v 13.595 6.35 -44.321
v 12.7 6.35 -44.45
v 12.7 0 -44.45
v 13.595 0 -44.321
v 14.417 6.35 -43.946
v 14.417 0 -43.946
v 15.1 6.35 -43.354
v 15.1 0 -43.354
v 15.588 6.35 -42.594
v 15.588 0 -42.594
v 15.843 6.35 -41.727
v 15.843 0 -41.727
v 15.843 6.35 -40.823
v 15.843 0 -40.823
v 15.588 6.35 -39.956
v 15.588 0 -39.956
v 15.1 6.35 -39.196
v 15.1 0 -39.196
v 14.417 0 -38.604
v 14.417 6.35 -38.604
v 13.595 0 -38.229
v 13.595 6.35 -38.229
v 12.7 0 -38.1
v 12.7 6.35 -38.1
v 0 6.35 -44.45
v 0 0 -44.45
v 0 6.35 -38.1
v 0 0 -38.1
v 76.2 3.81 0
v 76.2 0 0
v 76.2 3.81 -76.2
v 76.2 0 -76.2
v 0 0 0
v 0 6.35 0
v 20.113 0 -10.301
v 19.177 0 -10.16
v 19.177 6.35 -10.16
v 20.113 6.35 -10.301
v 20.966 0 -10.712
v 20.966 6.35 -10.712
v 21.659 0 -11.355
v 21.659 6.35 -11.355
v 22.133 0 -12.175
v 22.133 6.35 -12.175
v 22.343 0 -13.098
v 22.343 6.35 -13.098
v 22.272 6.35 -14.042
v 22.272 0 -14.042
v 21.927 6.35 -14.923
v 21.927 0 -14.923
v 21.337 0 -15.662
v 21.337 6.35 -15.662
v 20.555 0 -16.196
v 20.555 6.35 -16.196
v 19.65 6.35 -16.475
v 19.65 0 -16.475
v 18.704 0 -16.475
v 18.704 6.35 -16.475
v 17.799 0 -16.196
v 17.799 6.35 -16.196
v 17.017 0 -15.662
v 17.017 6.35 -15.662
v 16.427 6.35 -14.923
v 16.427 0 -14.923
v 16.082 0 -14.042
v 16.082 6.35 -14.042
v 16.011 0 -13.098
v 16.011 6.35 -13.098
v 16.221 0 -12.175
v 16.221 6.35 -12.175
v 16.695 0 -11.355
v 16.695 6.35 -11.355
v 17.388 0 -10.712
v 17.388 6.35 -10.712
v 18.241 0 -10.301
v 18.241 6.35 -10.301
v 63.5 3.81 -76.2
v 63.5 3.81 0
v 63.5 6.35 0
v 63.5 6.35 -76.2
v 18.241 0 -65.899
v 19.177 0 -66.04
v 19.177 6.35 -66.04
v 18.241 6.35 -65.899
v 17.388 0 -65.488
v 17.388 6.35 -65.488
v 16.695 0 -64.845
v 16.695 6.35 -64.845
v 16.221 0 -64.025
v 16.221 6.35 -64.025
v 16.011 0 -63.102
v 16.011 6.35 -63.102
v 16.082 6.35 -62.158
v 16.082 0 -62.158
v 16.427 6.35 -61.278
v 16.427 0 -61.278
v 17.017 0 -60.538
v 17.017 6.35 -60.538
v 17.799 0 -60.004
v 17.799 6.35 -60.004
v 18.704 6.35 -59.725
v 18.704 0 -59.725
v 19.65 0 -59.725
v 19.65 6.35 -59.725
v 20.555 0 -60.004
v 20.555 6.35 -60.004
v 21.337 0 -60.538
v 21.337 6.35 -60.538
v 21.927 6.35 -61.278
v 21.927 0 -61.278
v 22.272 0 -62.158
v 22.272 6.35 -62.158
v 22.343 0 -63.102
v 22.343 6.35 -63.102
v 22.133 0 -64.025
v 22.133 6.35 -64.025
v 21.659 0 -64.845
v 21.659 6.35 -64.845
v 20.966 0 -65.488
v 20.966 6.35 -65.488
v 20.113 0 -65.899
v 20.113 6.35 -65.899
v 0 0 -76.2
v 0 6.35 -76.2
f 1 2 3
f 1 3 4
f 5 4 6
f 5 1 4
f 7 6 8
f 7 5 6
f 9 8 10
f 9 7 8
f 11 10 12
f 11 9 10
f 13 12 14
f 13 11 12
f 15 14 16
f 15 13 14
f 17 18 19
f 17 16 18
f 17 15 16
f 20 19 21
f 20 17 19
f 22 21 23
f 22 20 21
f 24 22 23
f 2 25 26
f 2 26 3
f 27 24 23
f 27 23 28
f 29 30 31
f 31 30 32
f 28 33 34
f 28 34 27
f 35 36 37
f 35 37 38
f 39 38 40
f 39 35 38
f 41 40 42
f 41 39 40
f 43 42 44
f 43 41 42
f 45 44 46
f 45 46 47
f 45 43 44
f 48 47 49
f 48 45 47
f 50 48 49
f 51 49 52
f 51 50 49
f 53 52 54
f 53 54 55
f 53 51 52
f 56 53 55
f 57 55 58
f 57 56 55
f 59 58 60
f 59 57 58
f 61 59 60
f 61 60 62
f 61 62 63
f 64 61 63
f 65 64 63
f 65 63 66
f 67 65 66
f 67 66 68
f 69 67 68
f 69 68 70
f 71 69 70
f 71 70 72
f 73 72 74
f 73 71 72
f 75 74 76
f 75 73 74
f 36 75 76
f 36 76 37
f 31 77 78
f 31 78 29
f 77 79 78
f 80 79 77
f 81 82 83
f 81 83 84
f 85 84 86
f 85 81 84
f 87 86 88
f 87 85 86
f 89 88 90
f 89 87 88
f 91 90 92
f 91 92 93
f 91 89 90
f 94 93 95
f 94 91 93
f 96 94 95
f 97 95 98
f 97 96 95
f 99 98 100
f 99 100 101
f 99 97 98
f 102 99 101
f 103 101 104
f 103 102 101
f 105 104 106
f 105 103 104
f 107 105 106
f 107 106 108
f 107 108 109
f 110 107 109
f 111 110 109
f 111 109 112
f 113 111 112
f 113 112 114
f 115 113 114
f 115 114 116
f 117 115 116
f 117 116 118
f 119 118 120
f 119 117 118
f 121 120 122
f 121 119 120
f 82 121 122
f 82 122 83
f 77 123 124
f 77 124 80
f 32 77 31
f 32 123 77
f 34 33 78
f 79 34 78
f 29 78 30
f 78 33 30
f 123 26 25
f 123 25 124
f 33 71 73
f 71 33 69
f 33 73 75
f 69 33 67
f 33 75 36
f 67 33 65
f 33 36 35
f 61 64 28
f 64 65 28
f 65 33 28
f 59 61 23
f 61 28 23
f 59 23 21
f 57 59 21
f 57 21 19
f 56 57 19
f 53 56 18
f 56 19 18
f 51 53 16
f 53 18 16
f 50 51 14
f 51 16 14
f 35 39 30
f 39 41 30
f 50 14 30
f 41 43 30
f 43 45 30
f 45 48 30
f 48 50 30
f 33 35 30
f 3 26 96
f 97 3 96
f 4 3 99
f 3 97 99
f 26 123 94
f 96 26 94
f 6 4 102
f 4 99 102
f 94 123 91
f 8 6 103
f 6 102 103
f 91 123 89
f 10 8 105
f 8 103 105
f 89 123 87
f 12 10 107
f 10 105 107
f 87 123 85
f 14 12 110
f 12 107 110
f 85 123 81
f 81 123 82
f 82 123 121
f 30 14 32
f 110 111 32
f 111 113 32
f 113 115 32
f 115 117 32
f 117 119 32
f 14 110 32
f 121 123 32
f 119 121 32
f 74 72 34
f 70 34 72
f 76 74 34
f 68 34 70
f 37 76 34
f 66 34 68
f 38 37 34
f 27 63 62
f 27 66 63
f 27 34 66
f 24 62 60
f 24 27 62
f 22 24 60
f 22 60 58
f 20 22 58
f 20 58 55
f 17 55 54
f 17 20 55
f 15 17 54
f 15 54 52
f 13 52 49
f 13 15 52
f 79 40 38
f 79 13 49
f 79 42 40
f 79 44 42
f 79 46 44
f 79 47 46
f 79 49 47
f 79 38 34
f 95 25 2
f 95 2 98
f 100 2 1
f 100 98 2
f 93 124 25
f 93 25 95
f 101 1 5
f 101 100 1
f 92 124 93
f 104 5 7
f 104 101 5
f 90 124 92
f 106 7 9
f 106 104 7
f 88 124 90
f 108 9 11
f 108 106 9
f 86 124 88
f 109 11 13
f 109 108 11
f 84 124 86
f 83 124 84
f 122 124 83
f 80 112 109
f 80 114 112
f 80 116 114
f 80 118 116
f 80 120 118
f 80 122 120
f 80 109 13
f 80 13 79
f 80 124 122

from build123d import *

# Parameters (mm, degrees)
SKETCH1_W           = 63.5
SKETCH1_H           = 76.2
SKETCH1_R           = 3.175
SKETCH1_W_2         = 12.7
BOSS_EXTRUDE1_DEPTH = 6.35
SKETCH2_W           = 12.7
SKETCH2_H           = 76.2
CUT_EXTRUDE1_DEPTH  = 2.54
CUT_EXTRUDE2_DEPTH  = 108.95


with BuildPart() as part:
    # Sketch1 → Boss-Extrude1 (new body)
    # profile 1 of 2: a face of its own
    with BuildSketch(Plane(origin=(0, 0, 0), x_dir=(1, 0, 0), z_dir=(0, 1, 0))):
        with Locations((31.75, 38.1)):
            Rectangle(SKETCH1_W, SKETCH1_H)
        with Locations(Location((19.177, 13.335, 0), (0, 0, 270))):
            Circle(SKETCH1_R, mode=Mode.SUBTRACT)
        with Locations(Location((19.177, 62.865, 0), (0, 0, 90))):
            Circle(SKETCH1_R, mode=Mode.SUBTRACT)
    # profile 2 of 2: a face of its own
    with BuildSketch(Plane(origin=(0, 0, 0), x_dir=(1, 0, 0), z_dir=(0, 1, 0))):
        with Locations((69.85, 38.1)):
            Rectangle(SKETCH1_W_2, SKETCH1_H)
    extrude(amount=BOSS_EXTRUDE1_DEPTH)

    # Sketch2 → Cut-Extrude1 (cut)
    with BuildSketch(Plane(origin=(0, 6.35, 0), x_dir=(1, 0, 0), z_dir=(0, 1, 0))):
        with Locations((69.85, 38.1)):
            Rectangle(SKETCH2_W, SKETCH2_H)
    extrude(amount=-CUT_EXTRUDE1_DEPTH, mode=Mode.SUBTRACT)

    # Sketch3 → Cut-Extrude2 (cut, through all)
    with BuildSketch(Plane(origin=(0, 6.35, 0), x_dir=(1, 0, 0), z_dir=(0, 1, 0))):
        with BuildLine():
            Line((0, 44.45), (12.7, 44.45))
            ThreePointArc((12.7, 44.45), (15.875, 41.275), (12.7, 38.1))
            Line((12.7, 38.1), (0, 38.1))
            Line((0, 38.1), (0, 44.45))
        make_face()
    extrude(amount=-CUT_EXTRUDE2_DEPTH, mode=Mode.SUBTRACT)


solid = part.part
